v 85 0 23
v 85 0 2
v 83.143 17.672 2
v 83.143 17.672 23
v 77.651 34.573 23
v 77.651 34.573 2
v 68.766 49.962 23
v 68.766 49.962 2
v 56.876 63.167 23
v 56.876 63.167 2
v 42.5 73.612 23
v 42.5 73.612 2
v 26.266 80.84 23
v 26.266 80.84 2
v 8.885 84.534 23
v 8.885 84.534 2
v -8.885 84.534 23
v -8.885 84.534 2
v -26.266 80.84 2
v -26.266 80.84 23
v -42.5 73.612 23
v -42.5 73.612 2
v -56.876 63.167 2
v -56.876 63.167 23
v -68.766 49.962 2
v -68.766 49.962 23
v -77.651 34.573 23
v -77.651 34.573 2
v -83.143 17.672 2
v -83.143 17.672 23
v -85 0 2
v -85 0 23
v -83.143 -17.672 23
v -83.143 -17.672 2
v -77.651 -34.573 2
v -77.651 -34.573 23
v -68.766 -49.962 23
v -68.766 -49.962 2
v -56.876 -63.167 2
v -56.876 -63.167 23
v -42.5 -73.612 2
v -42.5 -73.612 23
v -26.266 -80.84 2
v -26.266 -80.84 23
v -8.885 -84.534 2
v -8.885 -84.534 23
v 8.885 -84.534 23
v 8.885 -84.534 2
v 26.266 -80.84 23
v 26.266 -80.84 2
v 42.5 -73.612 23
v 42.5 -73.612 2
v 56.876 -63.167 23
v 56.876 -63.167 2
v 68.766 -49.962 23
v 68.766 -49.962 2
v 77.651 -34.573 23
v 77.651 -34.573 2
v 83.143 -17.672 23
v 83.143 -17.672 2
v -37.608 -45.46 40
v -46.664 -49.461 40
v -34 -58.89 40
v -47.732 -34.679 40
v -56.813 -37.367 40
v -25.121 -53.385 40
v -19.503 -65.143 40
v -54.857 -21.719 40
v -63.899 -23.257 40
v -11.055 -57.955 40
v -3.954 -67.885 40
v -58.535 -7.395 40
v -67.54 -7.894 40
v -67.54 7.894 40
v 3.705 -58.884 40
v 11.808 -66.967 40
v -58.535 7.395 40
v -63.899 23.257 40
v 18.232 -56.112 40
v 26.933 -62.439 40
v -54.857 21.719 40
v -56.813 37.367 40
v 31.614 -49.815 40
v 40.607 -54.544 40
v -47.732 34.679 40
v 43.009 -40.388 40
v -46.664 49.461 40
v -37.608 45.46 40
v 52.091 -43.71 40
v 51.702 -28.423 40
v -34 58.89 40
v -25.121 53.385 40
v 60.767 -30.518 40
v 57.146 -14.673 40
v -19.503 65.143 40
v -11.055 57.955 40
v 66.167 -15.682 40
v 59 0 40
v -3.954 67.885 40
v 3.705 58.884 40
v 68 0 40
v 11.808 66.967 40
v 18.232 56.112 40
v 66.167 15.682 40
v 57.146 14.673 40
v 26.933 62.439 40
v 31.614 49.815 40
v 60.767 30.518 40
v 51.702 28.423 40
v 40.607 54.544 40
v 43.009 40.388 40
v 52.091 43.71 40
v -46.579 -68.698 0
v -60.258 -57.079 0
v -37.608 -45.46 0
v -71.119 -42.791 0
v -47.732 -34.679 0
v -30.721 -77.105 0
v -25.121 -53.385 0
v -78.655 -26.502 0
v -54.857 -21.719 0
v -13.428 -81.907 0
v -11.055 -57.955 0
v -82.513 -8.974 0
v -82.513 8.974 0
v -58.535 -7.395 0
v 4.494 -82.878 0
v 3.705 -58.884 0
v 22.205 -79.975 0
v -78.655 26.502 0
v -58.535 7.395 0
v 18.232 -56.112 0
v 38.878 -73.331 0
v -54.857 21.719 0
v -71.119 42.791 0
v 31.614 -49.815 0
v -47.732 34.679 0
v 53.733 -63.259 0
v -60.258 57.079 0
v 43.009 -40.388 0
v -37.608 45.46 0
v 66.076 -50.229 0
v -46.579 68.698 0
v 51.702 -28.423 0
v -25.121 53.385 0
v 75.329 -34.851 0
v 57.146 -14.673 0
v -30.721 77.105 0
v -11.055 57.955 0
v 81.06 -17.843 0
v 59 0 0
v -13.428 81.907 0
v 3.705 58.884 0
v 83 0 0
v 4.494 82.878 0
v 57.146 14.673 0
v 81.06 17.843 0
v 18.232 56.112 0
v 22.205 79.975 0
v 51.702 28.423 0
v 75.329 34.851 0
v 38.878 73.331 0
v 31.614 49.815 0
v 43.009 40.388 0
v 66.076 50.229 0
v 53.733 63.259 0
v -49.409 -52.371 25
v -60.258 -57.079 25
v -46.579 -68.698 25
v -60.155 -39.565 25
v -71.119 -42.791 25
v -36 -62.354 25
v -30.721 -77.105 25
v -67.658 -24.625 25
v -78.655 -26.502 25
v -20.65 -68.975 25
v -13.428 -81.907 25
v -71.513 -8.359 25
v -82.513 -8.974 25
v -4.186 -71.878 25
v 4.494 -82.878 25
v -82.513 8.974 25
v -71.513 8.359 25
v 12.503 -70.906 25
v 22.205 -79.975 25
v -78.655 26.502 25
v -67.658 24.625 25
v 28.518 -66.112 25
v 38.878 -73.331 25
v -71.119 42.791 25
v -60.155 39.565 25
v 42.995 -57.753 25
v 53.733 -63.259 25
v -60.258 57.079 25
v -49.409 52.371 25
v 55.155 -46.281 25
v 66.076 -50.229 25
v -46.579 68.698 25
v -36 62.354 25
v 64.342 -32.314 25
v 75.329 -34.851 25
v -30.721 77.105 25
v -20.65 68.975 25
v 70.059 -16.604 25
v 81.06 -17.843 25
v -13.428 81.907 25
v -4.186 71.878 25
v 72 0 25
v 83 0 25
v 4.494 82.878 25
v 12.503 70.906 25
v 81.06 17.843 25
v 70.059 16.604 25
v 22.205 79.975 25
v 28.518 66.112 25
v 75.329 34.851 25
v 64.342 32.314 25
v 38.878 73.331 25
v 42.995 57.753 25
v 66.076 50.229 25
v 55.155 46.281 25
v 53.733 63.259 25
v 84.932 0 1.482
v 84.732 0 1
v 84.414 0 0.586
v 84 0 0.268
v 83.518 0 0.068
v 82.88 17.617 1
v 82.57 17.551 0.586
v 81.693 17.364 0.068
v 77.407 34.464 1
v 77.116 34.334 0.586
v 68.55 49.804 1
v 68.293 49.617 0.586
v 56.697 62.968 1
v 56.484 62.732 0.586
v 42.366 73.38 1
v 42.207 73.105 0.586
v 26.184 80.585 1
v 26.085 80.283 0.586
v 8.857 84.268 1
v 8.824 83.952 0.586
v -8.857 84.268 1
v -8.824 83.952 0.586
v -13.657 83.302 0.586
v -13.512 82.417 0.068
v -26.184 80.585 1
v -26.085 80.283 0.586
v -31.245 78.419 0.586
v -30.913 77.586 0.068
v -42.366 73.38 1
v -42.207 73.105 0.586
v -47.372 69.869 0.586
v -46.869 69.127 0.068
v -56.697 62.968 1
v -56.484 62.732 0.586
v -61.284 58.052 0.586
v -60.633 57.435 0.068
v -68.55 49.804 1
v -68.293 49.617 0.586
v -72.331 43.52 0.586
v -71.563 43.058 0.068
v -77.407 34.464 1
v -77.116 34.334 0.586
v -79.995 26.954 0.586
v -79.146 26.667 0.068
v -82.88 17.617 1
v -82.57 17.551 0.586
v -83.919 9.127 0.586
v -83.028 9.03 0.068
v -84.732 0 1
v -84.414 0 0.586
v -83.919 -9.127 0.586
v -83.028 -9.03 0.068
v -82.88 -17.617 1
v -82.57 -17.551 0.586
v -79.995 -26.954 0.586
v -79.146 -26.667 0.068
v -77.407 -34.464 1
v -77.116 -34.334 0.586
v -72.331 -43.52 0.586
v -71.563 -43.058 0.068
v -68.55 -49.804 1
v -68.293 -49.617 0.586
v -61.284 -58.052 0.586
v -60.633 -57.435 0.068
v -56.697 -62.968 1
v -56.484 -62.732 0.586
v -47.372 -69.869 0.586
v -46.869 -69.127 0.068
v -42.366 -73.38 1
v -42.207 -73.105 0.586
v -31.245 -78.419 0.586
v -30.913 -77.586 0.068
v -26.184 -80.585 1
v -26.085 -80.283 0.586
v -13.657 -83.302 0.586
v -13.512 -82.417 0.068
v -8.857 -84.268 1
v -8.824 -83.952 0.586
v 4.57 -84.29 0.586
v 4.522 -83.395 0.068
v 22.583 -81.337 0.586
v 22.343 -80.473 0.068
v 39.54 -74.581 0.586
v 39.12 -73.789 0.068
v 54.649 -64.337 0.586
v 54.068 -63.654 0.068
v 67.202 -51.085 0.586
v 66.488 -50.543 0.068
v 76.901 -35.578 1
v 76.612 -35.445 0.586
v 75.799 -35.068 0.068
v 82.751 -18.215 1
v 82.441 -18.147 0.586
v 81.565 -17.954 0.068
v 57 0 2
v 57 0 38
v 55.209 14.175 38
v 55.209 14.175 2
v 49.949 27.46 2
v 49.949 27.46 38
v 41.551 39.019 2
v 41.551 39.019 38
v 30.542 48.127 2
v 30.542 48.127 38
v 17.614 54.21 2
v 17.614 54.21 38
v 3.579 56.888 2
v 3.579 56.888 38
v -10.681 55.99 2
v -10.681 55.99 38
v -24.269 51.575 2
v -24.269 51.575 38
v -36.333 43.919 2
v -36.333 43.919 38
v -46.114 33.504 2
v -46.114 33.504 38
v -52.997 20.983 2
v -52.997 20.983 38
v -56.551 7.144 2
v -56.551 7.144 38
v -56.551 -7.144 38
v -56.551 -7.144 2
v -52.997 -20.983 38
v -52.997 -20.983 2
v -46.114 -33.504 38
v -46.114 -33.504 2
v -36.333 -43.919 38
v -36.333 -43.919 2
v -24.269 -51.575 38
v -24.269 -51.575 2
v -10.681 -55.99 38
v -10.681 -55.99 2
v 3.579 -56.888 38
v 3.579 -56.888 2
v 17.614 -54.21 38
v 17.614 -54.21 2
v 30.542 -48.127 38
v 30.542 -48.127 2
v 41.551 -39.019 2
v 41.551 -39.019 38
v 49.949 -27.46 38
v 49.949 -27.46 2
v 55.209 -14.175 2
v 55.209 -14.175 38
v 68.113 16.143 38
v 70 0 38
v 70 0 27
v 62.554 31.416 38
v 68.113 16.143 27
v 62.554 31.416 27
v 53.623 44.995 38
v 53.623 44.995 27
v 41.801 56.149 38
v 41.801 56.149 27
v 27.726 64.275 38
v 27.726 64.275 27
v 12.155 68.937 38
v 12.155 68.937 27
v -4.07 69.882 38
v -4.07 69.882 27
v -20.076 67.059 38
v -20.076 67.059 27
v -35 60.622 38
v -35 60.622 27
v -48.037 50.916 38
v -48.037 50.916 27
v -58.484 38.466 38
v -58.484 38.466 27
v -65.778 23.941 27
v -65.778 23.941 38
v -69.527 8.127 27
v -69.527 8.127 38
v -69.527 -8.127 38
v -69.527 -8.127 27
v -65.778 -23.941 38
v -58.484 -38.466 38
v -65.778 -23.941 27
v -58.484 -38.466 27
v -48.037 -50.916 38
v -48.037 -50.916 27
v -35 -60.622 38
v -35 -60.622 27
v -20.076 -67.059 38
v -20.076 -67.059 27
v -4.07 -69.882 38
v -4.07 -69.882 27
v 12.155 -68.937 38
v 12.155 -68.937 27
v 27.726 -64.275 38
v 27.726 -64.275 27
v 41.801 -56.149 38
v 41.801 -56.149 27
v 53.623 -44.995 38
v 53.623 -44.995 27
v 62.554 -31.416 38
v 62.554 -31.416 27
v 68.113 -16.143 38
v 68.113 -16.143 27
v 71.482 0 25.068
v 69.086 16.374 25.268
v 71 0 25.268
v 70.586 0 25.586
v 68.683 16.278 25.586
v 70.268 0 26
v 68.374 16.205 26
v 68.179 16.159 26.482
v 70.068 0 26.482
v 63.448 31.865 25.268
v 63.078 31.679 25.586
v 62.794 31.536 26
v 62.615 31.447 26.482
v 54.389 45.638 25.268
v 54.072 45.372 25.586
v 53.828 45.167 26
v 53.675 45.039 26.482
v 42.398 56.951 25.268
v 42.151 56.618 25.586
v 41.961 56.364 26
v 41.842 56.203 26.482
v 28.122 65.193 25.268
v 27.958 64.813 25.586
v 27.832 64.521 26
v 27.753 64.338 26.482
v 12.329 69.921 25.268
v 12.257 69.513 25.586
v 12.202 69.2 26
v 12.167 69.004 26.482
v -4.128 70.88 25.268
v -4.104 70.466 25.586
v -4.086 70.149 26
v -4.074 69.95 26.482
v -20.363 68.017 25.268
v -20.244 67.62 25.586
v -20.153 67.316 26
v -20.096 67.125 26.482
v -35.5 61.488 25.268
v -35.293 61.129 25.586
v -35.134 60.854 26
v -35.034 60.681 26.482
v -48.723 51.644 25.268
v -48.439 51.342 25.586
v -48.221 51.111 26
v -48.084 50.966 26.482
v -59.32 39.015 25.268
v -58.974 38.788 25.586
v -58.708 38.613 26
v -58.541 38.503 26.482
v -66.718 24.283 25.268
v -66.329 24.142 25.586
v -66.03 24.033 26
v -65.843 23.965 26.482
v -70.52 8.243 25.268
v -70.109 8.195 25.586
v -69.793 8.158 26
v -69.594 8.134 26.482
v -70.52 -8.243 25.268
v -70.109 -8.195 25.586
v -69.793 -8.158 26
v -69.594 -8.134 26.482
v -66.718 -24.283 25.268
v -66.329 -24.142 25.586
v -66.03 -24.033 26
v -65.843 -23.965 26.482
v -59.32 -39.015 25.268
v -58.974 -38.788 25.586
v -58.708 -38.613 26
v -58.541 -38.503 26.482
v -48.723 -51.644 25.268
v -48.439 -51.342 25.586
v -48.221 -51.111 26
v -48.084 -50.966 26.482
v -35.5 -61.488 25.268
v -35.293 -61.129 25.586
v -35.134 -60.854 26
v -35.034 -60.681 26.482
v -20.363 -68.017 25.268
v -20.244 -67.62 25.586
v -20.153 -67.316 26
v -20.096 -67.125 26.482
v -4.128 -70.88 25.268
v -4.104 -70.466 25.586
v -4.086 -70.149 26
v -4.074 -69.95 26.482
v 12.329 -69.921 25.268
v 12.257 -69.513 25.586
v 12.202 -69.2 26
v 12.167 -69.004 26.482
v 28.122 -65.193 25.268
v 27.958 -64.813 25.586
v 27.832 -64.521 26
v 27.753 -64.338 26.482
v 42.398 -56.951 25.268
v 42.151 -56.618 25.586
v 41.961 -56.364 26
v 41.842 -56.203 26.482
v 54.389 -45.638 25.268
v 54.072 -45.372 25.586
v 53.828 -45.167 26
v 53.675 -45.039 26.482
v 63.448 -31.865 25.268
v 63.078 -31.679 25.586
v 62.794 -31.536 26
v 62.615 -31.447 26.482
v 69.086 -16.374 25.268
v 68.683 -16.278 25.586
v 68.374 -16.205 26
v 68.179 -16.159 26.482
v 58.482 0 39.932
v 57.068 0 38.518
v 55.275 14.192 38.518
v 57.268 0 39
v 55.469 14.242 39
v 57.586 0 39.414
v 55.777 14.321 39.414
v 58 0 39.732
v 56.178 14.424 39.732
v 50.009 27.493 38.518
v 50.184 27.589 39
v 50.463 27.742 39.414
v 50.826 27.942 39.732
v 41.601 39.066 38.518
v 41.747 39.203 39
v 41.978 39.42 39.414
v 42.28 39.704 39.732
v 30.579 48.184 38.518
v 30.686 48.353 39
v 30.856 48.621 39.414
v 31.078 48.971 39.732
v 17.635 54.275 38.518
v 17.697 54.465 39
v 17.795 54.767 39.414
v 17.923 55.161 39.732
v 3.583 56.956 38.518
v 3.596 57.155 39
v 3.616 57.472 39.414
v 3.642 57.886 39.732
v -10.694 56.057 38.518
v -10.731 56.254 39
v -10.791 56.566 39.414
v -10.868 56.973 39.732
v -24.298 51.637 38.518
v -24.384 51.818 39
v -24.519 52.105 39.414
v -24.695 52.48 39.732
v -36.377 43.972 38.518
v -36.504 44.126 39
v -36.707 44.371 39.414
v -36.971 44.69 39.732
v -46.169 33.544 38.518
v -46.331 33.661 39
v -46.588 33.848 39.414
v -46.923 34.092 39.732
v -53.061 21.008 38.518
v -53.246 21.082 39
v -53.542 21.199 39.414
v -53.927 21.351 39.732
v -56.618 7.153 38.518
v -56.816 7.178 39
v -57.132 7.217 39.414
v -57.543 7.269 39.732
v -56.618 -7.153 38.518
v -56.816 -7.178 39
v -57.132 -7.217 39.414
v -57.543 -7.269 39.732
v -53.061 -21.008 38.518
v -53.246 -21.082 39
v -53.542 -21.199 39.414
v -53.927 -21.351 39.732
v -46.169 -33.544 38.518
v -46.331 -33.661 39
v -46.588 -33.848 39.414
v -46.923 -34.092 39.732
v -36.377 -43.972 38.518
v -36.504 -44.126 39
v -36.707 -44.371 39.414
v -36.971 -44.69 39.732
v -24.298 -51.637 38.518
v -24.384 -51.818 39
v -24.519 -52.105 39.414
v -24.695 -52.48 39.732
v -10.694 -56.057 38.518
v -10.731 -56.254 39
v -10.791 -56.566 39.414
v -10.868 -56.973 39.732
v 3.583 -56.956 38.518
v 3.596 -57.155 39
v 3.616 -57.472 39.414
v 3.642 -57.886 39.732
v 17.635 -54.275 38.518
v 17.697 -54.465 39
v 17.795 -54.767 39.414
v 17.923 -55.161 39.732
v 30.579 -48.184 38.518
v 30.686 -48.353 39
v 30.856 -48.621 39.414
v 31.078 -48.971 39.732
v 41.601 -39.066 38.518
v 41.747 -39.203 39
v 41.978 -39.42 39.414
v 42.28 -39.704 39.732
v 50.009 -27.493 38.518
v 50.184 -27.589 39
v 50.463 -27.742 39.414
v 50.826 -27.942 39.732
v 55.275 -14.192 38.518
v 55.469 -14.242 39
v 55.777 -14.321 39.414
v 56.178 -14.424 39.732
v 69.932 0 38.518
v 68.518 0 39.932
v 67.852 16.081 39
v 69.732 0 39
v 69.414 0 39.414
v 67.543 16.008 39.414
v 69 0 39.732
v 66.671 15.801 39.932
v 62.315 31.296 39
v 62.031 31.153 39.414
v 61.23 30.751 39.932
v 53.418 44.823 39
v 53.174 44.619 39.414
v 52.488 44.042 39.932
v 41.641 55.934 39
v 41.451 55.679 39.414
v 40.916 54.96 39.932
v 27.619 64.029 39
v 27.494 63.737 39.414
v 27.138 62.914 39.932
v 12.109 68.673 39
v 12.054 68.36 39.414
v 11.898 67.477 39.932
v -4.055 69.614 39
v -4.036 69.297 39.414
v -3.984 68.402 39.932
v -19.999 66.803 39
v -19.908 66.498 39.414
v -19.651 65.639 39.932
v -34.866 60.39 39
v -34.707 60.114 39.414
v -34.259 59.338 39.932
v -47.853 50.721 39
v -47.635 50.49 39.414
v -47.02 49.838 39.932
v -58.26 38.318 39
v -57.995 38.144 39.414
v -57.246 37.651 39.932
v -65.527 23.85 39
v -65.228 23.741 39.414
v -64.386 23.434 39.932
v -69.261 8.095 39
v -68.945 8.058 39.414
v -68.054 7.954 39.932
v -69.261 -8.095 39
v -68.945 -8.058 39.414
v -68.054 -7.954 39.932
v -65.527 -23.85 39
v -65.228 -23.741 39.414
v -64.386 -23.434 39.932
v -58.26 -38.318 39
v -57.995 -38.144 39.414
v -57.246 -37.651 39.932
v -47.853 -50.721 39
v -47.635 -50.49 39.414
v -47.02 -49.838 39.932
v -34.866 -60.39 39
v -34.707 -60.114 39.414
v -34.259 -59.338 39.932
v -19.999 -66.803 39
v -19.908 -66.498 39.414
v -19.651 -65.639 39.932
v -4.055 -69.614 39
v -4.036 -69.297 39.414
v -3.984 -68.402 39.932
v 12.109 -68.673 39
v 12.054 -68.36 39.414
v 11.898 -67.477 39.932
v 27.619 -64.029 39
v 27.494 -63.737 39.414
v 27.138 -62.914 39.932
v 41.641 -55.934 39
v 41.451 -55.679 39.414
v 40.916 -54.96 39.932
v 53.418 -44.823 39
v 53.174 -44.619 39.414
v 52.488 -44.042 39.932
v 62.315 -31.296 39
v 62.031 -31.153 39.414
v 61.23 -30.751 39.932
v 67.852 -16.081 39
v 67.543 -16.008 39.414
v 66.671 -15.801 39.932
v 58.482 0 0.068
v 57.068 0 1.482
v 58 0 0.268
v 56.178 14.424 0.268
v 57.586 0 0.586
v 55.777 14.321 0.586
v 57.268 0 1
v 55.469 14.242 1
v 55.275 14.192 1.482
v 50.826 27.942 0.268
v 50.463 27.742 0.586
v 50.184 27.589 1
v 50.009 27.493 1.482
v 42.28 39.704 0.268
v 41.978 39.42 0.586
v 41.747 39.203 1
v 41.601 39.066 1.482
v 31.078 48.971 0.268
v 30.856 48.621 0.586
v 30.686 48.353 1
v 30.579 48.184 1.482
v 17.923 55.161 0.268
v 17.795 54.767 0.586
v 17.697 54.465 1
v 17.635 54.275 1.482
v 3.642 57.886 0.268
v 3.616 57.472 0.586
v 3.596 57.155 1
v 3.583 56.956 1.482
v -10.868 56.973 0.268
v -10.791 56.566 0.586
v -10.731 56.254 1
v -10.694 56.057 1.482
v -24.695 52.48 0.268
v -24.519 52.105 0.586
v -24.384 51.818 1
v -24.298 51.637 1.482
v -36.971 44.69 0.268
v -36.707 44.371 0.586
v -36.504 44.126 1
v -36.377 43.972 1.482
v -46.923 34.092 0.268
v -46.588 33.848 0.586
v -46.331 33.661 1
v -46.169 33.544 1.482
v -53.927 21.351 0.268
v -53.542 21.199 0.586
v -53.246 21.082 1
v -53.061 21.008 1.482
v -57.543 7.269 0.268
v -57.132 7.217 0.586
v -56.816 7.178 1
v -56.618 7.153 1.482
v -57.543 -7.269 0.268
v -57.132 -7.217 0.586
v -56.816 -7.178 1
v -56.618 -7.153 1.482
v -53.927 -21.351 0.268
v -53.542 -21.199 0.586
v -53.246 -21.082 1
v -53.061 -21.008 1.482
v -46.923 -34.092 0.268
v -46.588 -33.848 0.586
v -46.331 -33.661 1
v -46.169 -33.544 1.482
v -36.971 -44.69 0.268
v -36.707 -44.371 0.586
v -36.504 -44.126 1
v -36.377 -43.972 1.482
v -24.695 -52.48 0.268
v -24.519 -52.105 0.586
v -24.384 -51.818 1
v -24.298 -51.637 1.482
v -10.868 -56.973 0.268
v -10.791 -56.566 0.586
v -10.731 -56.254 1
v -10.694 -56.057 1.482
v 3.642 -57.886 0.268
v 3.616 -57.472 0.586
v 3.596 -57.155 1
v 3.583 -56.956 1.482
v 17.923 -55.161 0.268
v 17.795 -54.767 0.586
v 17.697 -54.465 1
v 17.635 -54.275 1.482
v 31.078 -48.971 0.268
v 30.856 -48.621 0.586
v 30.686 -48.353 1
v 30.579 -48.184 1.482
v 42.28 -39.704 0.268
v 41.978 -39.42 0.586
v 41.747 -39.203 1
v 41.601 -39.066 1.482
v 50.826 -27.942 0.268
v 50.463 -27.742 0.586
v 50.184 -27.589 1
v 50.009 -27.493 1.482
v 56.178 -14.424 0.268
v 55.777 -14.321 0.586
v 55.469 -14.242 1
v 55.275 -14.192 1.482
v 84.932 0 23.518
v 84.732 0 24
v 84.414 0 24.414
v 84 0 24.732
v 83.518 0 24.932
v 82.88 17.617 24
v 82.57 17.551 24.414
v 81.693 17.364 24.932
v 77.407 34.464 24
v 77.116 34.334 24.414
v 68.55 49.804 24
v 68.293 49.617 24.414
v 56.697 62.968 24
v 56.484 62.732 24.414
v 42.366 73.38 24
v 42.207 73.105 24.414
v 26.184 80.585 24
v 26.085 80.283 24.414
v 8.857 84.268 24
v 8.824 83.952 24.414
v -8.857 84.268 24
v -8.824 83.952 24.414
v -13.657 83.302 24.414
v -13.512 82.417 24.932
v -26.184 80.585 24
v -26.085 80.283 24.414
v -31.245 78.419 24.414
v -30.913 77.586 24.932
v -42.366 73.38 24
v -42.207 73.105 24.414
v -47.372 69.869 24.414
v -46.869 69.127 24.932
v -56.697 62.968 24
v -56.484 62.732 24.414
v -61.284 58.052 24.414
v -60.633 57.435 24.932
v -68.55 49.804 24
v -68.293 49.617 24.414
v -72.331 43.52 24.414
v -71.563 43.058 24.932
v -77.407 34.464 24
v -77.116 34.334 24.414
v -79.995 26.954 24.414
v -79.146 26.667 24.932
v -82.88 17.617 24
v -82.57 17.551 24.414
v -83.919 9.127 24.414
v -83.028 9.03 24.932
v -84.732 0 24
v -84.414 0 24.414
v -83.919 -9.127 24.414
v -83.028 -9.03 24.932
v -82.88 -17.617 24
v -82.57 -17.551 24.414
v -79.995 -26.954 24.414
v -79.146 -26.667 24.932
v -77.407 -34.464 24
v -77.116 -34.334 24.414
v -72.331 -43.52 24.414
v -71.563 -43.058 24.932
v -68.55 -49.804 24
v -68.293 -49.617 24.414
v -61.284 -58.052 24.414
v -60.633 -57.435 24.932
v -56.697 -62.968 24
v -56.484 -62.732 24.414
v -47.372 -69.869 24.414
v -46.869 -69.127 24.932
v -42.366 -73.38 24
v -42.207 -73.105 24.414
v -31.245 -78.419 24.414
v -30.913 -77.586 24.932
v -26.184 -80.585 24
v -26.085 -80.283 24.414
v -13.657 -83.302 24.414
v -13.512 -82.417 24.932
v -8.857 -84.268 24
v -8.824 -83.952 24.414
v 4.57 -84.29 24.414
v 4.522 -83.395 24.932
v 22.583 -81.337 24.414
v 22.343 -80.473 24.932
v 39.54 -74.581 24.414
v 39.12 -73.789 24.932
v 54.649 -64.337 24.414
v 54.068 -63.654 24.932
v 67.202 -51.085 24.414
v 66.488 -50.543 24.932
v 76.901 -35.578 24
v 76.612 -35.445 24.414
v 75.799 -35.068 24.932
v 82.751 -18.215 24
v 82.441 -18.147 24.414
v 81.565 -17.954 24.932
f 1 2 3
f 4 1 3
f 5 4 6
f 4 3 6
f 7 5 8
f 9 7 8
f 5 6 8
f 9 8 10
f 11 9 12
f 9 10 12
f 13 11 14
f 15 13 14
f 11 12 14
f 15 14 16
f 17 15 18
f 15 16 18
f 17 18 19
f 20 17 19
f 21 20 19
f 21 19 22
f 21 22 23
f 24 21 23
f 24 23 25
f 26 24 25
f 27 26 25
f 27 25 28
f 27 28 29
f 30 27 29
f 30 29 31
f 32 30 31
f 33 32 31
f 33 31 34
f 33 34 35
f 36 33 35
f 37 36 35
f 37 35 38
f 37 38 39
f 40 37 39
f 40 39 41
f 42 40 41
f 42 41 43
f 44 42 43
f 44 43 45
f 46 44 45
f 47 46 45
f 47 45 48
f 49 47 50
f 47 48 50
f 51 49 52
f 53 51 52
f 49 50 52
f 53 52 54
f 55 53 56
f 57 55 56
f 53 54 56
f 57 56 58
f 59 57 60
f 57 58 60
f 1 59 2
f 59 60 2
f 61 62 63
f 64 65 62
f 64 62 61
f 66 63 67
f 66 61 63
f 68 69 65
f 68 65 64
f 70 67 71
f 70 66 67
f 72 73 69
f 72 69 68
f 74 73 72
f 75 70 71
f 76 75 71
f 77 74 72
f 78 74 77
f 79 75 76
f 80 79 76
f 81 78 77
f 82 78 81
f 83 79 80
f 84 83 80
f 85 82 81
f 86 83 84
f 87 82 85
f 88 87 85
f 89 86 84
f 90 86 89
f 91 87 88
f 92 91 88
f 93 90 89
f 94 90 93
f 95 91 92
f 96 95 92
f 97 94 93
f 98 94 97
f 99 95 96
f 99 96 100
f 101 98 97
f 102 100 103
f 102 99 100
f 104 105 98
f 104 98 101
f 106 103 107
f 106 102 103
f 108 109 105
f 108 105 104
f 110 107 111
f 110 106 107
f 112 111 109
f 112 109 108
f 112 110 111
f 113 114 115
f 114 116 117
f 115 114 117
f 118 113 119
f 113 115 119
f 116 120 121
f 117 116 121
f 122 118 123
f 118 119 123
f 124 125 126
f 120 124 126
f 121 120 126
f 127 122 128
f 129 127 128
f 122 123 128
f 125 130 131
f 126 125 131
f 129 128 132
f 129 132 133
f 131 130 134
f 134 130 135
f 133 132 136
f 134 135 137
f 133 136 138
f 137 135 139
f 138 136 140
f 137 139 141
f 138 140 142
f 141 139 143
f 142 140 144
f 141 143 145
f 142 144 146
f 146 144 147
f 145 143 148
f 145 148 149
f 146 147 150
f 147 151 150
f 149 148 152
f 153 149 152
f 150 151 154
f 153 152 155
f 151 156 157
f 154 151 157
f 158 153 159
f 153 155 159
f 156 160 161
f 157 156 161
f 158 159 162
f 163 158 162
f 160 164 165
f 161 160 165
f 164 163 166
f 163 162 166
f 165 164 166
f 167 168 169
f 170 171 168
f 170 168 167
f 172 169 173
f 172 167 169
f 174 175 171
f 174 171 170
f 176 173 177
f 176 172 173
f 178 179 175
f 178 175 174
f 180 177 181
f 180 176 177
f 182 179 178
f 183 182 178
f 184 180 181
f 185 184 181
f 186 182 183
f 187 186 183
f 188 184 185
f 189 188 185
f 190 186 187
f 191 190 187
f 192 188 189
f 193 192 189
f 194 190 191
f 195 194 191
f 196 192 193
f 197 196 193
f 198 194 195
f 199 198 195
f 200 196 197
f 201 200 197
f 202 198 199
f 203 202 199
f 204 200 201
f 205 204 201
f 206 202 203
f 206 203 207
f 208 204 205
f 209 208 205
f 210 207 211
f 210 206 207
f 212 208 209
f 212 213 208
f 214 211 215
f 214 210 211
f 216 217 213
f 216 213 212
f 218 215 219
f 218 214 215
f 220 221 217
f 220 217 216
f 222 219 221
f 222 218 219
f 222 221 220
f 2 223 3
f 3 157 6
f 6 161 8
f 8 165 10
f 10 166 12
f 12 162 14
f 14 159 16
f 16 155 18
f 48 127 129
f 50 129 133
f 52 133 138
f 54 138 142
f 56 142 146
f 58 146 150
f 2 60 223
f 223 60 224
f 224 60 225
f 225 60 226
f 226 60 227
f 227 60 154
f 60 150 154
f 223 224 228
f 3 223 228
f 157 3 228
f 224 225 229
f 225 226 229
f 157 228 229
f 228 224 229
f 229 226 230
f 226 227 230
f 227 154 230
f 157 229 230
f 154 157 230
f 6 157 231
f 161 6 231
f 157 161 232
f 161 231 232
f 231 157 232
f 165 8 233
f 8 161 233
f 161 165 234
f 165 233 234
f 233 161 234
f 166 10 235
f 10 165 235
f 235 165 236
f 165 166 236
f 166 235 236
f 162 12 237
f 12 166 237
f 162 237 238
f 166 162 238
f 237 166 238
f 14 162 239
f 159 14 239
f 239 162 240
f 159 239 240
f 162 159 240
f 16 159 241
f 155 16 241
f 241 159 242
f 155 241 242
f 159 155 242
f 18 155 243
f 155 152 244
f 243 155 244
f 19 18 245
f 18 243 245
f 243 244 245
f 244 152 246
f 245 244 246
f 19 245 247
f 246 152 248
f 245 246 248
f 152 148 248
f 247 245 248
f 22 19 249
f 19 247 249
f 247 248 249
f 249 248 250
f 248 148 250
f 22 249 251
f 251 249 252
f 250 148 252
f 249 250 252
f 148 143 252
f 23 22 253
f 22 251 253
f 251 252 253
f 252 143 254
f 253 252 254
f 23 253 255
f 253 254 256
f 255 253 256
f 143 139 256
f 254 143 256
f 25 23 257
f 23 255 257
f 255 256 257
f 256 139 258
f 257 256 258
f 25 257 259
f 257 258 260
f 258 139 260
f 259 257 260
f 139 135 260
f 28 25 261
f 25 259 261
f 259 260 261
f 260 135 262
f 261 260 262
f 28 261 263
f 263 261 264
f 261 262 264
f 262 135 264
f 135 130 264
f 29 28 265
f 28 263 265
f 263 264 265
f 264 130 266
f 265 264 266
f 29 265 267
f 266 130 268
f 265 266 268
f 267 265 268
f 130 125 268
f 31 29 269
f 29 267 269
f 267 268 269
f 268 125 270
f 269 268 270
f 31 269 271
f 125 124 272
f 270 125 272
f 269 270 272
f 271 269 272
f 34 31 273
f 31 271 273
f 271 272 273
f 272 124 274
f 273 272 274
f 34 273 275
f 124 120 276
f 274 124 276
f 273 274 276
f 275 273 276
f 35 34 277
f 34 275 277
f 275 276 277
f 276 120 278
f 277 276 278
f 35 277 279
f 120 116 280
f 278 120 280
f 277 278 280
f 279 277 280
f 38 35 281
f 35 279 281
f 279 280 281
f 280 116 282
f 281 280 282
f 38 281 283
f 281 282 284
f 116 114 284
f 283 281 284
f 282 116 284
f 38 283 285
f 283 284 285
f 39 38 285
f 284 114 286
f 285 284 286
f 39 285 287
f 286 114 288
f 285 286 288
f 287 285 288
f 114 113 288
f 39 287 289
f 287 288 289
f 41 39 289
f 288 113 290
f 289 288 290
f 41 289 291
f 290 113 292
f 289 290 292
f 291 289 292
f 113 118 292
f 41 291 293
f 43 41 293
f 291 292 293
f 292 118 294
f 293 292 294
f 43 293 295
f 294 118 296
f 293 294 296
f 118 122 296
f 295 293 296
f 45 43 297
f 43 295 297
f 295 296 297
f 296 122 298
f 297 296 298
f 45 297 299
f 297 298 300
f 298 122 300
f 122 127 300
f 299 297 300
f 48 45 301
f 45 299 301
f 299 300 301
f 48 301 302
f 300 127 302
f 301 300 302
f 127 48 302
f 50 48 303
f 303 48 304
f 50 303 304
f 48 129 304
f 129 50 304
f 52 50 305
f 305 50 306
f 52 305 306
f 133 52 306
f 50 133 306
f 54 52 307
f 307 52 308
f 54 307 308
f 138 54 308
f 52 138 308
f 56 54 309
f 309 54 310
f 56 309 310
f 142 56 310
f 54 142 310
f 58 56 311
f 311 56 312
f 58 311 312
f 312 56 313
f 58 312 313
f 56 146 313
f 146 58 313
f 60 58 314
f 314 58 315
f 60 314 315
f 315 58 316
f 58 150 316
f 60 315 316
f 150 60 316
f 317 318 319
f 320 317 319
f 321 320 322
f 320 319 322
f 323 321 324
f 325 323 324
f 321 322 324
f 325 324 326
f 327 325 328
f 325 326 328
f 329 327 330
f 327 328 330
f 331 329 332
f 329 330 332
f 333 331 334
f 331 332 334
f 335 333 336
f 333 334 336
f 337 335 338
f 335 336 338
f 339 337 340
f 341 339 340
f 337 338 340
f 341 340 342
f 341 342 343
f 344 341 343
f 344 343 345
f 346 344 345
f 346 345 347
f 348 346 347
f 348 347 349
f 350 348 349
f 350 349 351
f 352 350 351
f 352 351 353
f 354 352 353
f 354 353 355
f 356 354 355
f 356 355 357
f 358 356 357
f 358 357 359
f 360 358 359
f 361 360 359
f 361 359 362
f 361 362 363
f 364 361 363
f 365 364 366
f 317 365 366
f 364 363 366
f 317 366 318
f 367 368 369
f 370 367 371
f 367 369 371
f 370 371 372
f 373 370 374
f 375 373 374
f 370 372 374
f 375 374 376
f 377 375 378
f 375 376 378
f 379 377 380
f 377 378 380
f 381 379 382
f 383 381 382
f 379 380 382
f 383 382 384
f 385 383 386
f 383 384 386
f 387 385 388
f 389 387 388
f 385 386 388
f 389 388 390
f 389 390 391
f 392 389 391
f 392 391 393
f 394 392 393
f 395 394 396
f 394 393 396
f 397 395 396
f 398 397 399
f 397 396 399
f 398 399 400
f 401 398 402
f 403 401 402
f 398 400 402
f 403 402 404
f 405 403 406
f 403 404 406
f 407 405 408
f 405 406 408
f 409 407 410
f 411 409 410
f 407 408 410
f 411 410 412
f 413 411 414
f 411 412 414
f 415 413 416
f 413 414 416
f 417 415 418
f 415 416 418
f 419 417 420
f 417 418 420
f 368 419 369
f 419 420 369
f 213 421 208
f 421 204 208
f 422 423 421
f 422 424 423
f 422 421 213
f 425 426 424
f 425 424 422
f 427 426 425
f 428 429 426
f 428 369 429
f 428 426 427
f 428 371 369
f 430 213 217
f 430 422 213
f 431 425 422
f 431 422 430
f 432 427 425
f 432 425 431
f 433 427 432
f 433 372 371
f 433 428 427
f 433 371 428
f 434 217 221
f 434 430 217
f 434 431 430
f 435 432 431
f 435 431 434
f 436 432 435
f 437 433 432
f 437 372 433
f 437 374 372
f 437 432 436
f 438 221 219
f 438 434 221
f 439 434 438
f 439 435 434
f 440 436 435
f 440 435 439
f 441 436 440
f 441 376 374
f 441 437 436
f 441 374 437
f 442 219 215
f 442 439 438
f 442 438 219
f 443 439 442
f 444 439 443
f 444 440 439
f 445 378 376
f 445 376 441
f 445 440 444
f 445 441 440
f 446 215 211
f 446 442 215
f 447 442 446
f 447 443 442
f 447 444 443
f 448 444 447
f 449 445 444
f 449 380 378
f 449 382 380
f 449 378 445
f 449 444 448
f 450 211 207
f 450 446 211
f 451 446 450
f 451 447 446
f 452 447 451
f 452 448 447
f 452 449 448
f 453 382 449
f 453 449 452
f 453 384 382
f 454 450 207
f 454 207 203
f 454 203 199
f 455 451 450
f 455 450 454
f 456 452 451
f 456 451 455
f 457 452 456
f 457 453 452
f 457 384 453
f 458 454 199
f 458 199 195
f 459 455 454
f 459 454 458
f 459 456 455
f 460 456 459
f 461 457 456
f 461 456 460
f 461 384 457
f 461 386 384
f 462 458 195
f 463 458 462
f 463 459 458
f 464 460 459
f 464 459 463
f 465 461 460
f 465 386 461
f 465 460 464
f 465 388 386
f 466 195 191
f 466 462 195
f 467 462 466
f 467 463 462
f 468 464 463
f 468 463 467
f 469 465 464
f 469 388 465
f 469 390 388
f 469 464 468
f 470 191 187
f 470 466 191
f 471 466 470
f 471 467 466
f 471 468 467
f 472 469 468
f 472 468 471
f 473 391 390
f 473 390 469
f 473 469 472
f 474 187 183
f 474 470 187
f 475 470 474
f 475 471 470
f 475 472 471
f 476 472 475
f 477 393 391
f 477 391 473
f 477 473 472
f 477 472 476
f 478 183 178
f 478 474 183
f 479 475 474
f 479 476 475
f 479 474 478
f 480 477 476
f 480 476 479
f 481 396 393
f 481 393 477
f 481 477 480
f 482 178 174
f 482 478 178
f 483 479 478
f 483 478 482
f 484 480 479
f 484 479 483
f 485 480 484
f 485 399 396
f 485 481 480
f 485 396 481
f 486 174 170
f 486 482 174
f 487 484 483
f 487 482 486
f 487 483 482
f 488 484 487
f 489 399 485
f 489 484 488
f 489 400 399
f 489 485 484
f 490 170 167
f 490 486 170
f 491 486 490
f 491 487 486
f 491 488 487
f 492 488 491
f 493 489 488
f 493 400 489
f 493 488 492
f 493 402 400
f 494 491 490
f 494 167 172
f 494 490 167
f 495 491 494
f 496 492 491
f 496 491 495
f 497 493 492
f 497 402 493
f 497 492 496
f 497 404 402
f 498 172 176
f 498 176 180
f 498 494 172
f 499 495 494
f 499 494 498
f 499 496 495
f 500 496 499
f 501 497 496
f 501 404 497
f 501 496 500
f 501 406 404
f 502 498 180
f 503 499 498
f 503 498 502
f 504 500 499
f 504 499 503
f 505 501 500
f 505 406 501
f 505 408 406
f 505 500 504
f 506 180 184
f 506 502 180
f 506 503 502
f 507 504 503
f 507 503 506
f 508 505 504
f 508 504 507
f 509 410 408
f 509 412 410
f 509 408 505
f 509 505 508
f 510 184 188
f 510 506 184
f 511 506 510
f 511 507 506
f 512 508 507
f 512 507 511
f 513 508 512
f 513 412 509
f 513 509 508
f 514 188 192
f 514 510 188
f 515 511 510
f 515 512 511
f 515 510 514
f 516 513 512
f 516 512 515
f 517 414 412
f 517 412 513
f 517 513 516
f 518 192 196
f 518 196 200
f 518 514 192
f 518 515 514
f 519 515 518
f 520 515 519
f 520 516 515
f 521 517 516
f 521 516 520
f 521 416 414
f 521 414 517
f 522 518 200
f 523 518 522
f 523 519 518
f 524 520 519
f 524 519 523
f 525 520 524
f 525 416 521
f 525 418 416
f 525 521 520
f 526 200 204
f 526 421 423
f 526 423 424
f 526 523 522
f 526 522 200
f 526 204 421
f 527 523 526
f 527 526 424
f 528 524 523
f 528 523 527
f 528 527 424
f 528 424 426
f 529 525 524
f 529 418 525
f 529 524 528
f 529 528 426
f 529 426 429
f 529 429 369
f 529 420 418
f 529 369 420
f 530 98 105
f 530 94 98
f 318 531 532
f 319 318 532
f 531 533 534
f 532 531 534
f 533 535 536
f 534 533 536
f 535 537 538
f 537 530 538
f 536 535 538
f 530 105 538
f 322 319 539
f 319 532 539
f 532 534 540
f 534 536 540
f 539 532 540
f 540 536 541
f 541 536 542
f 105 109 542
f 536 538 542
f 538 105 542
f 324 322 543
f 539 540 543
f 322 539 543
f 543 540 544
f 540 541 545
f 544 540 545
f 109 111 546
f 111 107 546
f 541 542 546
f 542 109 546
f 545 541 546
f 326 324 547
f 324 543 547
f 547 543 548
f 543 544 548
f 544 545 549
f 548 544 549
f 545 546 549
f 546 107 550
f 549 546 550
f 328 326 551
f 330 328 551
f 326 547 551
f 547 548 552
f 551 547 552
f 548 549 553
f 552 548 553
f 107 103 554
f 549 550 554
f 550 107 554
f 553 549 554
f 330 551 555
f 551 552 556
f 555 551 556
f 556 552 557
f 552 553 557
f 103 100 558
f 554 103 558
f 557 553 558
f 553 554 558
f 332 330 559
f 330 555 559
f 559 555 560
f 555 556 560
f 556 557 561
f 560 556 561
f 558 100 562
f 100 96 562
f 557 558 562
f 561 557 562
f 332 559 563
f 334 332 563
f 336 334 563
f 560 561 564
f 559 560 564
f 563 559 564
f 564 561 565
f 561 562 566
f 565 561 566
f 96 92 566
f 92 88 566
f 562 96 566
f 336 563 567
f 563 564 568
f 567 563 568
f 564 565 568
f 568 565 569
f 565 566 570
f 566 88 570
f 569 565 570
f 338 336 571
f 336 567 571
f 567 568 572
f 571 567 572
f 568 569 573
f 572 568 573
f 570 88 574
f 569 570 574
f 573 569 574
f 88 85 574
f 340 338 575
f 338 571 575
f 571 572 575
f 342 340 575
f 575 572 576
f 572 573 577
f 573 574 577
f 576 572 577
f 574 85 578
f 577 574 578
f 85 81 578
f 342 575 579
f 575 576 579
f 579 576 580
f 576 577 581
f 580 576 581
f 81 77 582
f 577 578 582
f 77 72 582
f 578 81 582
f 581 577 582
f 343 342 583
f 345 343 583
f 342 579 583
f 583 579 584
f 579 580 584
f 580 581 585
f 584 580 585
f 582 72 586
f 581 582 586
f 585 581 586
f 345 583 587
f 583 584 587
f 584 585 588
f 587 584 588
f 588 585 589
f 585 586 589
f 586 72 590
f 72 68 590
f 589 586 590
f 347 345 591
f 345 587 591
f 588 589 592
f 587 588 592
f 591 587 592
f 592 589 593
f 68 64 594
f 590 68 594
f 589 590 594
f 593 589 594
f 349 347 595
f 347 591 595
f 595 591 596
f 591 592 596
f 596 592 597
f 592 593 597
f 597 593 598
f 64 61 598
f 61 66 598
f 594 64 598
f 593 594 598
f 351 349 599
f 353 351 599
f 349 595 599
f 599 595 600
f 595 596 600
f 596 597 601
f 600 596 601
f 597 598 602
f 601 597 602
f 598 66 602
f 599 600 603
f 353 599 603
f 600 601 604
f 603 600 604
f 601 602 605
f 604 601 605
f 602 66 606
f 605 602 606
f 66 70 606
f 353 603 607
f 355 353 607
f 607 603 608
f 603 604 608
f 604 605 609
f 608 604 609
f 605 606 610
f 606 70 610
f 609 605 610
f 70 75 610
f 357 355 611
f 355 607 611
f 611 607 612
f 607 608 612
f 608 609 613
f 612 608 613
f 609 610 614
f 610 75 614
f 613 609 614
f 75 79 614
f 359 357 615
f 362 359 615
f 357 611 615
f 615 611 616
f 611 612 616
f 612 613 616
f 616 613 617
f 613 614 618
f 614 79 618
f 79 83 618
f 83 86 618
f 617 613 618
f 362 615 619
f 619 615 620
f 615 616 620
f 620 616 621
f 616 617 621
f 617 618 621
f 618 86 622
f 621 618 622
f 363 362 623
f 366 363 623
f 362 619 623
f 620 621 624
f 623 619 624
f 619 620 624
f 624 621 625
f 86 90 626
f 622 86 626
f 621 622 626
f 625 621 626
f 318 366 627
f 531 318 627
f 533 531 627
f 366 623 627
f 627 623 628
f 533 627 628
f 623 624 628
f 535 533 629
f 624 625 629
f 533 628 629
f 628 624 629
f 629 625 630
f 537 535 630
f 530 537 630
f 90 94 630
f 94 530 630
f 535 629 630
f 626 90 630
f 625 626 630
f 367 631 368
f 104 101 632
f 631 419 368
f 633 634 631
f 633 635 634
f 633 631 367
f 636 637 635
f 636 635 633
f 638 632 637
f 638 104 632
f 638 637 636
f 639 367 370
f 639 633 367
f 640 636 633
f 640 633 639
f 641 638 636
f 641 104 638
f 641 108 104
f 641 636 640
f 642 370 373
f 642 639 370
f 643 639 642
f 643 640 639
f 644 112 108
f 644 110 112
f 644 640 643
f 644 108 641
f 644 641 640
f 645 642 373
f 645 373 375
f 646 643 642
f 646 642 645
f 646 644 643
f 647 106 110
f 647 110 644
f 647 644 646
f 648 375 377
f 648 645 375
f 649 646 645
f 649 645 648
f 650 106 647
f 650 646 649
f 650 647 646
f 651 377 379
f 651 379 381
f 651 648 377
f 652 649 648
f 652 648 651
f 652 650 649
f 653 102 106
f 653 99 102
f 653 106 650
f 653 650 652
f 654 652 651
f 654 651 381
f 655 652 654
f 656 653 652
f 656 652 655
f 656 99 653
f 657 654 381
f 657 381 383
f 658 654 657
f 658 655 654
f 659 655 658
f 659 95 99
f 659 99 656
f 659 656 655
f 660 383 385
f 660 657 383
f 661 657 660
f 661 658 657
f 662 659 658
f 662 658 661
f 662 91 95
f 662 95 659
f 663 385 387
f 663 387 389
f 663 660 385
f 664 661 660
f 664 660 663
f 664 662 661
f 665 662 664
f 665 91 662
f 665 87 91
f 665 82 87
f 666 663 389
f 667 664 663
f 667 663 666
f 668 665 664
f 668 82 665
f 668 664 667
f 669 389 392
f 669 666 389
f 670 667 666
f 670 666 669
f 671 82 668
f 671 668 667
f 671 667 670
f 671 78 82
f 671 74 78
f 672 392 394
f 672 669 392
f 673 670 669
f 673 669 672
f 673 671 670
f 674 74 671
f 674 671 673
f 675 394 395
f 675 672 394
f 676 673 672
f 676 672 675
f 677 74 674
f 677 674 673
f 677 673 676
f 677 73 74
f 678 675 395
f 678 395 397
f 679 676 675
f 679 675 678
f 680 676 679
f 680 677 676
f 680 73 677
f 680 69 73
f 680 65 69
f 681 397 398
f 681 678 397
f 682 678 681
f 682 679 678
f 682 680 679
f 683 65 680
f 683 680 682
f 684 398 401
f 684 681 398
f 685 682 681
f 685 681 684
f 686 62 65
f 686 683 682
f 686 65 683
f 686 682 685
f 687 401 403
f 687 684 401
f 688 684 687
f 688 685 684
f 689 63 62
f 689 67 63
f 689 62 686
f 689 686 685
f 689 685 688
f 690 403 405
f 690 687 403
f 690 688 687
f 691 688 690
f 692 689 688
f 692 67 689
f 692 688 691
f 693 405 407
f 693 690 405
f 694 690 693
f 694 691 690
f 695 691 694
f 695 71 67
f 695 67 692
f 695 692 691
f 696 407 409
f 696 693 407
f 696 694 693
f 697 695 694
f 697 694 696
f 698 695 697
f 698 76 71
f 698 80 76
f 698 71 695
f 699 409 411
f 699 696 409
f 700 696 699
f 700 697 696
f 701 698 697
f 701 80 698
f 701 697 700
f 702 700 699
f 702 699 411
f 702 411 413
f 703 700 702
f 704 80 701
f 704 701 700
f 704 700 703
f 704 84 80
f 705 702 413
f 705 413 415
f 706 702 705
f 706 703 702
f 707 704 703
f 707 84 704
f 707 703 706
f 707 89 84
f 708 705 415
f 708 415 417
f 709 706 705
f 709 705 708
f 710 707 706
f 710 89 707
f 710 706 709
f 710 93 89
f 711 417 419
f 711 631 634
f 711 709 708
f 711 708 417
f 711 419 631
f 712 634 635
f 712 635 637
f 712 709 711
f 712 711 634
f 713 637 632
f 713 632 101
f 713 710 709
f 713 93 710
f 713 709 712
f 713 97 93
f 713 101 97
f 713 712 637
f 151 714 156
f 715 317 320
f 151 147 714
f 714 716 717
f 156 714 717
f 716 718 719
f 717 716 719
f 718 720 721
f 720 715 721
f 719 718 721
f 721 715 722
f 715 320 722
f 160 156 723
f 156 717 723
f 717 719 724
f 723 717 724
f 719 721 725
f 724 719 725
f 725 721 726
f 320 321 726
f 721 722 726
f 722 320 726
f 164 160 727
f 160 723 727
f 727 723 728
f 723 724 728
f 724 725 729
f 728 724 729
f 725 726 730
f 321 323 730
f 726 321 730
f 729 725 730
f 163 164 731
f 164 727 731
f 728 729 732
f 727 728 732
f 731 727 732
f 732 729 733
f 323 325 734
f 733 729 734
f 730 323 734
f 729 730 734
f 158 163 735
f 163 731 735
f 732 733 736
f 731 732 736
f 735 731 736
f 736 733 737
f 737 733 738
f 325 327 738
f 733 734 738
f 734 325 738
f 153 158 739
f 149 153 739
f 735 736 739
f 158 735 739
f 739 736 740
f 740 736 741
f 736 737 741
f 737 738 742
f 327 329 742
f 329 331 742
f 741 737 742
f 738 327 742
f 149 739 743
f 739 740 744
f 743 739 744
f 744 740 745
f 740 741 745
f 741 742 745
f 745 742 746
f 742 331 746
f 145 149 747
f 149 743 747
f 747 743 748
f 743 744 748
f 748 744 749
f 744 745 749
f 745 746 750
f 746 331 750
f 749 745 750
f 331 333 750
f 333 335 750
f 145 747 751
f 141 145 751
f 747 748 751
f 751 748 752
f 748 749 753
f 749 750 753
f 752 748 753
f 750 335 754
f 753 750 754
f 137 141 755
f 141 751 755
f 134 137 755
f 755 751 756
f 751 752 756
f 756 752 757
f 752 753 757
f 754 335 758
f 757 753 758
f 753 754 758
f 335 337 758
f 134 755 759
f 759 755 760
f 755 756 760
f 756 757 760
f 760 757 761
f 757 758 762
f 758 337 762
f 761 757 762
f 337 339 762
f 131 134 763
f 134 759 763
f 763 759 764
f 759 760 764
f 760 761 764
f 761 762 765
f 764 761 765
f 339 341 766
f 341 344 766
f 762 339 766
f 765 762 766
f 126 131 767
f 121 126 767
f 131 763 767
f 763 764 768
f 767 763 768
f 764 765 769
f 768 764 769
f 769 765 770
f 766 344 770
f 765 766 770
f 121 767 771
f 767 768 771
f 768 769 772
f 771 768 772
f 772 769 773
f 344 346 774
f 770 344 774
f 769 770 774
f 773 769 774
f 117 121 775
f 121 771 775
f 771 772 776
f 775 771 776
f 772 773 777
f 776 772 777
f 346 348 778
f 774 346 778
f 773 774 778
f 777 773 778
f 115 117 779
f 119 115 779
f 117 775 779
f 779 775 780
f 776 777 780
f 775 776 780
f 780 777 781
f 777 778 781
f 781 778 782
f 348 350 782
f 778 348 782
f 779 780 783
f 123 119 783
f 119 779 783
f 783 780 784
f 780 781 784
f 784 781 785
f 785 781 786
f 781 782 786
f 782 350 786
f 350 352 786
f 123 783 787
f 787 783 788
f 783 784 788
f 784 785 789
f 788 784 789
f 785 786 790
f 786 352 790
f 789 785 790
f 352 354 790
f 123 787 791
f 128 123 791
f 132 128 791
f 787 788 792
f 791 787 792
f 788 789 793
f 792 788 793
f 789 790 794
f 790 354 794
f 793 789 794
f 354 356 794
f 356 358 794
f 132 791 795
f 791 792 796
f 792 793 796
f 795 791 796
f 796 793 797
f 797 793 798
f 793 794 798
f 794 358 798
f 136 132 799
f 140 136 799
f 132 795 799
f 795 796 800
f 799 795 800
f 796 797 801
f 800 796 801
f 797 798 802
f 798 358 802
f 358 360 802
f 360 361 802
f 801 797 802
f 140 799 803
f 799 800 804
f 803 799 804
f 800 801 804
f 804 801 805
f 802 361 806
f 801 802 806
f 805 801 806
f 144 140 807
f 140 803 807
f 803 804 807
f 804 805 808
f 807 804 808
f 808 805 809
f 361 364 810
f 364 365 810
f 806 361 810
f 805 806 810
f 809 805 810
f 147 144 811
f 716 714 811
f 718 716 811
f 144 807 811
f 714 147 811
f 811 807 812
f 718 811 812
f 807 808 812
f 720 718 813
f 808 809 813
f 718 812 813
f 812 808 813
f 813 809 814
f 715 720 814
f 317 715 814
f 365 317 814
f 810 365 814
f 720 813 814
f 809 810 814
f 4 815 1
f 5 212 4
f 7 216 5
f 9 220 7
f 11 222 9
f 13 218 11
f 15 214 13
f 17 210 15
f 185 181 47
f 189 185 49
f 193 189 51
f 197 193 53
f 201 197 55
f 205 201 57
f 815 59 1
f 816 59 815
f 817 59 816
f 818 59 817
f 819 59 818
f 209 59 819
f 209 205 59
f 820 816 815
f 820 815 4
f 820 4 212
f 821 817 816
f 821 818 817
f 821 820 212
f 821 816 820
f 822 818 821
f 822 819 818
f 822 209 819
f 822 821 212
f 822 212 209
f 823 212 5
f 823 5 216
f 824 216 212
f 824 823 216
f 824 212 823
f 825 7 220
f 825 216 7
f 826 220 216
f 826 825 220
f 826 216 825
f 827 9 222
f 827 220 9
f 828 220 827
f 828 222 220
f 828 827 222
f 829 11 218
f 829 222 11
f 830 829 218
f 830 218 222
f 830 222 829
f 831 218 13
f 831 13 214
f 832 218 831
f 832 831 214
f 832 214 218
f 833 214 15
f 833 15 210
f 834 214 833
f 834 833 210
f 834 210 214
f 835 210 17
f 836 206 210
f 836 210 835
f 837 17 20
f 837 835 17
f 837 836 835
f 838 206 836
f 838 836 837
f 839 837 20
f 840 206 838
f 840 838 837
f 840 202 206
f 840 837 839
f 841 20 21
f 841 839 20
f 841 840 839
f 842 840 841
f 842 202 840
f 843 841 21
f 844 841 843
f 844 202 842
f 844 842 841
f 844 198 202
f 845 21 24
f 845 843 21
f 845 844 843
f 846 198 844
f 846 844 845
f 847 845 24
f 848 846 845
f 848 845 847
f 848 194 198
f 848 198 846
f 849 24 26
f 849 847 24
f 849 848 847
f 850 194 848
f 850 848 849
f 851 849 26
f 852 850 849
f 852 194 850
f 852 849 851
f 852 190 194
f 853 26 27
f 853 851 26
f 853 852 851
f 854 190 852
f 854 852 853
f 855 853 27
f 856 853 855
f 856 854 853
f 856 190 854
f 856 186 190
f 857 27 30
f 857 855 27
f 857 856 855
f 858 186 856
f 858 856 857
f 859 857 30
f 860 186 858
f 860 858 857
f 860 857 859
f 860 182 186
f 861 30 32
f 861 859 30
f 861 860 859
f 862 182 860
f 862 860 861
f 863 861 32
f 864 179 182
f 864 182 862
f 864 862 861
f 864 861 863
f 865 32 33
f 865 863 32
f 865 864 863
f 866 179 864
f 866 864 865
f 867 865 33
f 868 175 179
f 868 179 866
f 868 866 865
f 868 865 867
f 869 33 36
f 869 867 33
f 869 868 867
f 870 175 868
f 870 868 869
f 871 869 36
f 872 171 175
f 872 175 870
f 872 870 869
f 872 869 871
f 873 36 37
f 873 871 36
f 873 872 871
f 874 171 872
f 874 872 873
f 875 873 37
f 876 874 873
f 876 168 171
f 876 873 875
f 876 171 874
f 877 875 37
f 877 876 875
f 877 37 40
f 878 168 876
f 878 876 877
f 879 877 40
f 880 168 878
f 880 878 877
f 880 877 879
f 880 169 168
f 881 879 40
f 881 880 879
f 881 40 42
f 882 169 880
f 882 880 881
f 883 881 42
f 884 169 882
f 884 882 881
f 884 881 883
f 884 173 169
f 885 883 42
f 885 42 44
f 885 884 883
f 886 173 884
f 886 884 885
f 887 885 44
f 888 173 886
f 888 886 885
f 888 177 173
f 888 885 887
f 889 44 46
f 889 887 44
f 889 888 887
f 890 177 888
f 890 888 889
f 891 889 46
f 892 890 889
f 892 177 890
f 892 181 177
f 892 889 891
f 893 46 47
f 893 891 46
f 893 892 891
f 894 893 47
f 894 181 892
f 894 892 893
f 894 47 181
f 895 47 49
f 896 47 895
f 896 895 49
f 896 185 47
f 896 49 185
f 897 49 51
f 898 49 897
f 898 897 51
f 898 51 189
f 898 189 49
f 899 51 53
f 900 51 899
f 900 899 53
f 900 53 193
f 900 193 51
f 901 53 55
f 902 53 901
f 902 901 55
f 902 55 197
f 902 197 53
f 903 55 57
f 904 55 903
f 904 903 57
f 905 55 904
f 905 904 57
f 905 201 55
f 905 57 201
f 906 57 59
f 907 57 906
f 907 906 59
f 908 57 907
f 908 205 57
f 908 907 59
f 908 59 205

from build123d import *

# Parameters (mm, degrees)
SKETCH_1_R          = 85
EXTRUDE_1_DEPTH     = 40
SKETCH_2_R          = 57
CUT_EXTRUDE_1_DEPTH = 127.688594593
CUT_EXTRUDE_START   = -15
SKETCH_3_R          = 85
SKETCH_3_R_2        = 70
CUT_EXTRUDE_2_DEPTH = 15
FILLET_1_R          = 2


with BuildPart() as part:
    # 草图1 → 凸台-拉伸1 (new body)
    with BuildSketch(Plane.XY):
        Circle(SKETCH_1_R)
    extrude(amount=EXTRUDE_1_DEPTH)

    # 草图2 → 切除-拉伸1 (cut, through all)
    with BuildSketch(Plane.XY.offset(40)):
        Circle(SKETCH_2_R)
    extrude(amount=-CUT_EXTRUDE_1_DEPTH, mode=Mode.SUBTRACT)

    # 草图3 → 切除-拉伸2 (cut)
    with BuildSketch(Plane.XY.offset(40).offset(CUT_EXTRUDE_START)):
        Circle(SKETCH_3_R)
        Circle(SKETCH_3_R_2, mode=Mode.SUBTRACT)
    extrude(amount=CUT_EXTRUDE_2_DEPTH, mode=Mode.SUBTRACT)

    # 圆角1
    fillet_1_edges = [part.edges().sort_by_distance(p)[0] for p in [
        (-85, 0, 25),
        (-70, 0, 25),
        (-70, 0, 40),
        (-85, 0, 0),
        (-57, 0, 0),
        (-57, 0, 40),
    ]]
    fillet(fillet_1_edges, radius=FILLET_1_R)


solid = part.part
